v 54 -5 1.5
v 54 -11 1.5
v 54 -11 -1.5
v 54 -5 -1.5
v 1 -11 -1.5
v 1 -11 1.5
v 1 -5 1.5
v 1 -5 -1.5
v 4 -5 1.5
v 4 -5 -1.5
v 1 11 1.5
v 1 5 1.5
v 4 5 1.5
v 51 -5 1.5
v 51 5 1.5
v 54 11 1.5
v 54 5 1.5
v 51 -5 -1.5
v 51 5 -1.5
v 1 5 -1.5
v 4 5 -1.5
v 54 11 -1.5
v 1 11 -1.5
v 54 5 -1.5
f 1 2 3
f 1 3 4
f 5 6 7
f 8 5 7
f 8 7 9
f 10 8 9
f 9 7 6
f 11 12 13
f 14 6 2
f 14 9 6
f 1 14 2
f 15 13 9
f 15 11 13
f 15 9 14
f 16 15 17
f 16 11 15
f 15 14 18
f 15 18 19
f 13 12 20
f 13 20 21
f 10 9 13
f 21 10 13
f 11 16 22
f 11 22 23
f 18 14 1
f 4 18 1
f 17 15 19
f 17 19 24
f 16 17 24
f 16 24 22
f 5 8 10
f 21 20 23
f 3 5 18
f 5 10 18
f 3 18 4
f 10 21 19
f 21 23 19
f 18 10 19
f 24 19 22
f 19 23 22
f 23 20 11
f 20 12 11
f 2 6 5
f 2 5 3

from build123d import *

# Parameters (mm, degrees)
BOSS_EXTRUDE1_DEPTH = 1.5
SKETCH2_W           = 3
SKETCH2_H           = 10
CUT_EXTRUDE1_DEPTH  = 56.865910894
SKETCH3_W           = 55
SKETCH3_H           = 25
CUT_EXTRUDE2_DEPTH  = 56.865910894
SKETCH6_W           = 15
SKETCH6_H           = 3
CUT_EXTRUDE5_DEPTH  = 56.865910894


with BuildPart() as part:
    # Sketch1 → Boss-Extrude1 (new, symmetric)
    with BuildSketch(Plane.XY):
        Polygon((-20, -11), (20, -11), (20, -14), (35, -14), (35, -11), (54, -11), (54, 11), (-54, 11), (-54, -11), (-35, -11), (-35, -14), (-20, -14), align=None)
    extrude(amount=BOSS_EXTRUDE1_DEPTH, both=True)

    # Sketch2 → Cut-Extrude1 (cut, through all)
    with BuildSketch(Plane.XY.offset(1.5)):
        with Locations((2.5, 0)):
            Rectangle(SKETCH2_W, SKETCH2_H)
        with Locations((52.5, 0)):
            Rectangle(SKETCH2_W, SKETCH2_H)
    extrude(amount=-CUT_EXTRUDE1_DEPTH, mode=Mode.SUBTRACT)

    # Sketch3 → Cut-Extrude2 (cut, through all)
    with BuildSketch(Plane.XY.offset(1.5)):
        with Locations((-26.5, -1.5)):
            Rectangle(SKETCH3_W, SKETCH3_H)
    extrude(amount=-CUT_EXTRUDE2_DEPTH, mode=Mode.SUBTRACT)

    # Sketch6 → Cut-Extrude5 (cut, through all)
    with BuildSketch(Plane.XY.offset(1.5)):
        with Locations((27.5, -12.5)):
            Rectangle(SKETCH6_W, SKETCH6_H)
    extrude(amount=-CUT_EXTRUDE5_DEPTH, mode=Mode.SUBTRACT)


solid = part.part
